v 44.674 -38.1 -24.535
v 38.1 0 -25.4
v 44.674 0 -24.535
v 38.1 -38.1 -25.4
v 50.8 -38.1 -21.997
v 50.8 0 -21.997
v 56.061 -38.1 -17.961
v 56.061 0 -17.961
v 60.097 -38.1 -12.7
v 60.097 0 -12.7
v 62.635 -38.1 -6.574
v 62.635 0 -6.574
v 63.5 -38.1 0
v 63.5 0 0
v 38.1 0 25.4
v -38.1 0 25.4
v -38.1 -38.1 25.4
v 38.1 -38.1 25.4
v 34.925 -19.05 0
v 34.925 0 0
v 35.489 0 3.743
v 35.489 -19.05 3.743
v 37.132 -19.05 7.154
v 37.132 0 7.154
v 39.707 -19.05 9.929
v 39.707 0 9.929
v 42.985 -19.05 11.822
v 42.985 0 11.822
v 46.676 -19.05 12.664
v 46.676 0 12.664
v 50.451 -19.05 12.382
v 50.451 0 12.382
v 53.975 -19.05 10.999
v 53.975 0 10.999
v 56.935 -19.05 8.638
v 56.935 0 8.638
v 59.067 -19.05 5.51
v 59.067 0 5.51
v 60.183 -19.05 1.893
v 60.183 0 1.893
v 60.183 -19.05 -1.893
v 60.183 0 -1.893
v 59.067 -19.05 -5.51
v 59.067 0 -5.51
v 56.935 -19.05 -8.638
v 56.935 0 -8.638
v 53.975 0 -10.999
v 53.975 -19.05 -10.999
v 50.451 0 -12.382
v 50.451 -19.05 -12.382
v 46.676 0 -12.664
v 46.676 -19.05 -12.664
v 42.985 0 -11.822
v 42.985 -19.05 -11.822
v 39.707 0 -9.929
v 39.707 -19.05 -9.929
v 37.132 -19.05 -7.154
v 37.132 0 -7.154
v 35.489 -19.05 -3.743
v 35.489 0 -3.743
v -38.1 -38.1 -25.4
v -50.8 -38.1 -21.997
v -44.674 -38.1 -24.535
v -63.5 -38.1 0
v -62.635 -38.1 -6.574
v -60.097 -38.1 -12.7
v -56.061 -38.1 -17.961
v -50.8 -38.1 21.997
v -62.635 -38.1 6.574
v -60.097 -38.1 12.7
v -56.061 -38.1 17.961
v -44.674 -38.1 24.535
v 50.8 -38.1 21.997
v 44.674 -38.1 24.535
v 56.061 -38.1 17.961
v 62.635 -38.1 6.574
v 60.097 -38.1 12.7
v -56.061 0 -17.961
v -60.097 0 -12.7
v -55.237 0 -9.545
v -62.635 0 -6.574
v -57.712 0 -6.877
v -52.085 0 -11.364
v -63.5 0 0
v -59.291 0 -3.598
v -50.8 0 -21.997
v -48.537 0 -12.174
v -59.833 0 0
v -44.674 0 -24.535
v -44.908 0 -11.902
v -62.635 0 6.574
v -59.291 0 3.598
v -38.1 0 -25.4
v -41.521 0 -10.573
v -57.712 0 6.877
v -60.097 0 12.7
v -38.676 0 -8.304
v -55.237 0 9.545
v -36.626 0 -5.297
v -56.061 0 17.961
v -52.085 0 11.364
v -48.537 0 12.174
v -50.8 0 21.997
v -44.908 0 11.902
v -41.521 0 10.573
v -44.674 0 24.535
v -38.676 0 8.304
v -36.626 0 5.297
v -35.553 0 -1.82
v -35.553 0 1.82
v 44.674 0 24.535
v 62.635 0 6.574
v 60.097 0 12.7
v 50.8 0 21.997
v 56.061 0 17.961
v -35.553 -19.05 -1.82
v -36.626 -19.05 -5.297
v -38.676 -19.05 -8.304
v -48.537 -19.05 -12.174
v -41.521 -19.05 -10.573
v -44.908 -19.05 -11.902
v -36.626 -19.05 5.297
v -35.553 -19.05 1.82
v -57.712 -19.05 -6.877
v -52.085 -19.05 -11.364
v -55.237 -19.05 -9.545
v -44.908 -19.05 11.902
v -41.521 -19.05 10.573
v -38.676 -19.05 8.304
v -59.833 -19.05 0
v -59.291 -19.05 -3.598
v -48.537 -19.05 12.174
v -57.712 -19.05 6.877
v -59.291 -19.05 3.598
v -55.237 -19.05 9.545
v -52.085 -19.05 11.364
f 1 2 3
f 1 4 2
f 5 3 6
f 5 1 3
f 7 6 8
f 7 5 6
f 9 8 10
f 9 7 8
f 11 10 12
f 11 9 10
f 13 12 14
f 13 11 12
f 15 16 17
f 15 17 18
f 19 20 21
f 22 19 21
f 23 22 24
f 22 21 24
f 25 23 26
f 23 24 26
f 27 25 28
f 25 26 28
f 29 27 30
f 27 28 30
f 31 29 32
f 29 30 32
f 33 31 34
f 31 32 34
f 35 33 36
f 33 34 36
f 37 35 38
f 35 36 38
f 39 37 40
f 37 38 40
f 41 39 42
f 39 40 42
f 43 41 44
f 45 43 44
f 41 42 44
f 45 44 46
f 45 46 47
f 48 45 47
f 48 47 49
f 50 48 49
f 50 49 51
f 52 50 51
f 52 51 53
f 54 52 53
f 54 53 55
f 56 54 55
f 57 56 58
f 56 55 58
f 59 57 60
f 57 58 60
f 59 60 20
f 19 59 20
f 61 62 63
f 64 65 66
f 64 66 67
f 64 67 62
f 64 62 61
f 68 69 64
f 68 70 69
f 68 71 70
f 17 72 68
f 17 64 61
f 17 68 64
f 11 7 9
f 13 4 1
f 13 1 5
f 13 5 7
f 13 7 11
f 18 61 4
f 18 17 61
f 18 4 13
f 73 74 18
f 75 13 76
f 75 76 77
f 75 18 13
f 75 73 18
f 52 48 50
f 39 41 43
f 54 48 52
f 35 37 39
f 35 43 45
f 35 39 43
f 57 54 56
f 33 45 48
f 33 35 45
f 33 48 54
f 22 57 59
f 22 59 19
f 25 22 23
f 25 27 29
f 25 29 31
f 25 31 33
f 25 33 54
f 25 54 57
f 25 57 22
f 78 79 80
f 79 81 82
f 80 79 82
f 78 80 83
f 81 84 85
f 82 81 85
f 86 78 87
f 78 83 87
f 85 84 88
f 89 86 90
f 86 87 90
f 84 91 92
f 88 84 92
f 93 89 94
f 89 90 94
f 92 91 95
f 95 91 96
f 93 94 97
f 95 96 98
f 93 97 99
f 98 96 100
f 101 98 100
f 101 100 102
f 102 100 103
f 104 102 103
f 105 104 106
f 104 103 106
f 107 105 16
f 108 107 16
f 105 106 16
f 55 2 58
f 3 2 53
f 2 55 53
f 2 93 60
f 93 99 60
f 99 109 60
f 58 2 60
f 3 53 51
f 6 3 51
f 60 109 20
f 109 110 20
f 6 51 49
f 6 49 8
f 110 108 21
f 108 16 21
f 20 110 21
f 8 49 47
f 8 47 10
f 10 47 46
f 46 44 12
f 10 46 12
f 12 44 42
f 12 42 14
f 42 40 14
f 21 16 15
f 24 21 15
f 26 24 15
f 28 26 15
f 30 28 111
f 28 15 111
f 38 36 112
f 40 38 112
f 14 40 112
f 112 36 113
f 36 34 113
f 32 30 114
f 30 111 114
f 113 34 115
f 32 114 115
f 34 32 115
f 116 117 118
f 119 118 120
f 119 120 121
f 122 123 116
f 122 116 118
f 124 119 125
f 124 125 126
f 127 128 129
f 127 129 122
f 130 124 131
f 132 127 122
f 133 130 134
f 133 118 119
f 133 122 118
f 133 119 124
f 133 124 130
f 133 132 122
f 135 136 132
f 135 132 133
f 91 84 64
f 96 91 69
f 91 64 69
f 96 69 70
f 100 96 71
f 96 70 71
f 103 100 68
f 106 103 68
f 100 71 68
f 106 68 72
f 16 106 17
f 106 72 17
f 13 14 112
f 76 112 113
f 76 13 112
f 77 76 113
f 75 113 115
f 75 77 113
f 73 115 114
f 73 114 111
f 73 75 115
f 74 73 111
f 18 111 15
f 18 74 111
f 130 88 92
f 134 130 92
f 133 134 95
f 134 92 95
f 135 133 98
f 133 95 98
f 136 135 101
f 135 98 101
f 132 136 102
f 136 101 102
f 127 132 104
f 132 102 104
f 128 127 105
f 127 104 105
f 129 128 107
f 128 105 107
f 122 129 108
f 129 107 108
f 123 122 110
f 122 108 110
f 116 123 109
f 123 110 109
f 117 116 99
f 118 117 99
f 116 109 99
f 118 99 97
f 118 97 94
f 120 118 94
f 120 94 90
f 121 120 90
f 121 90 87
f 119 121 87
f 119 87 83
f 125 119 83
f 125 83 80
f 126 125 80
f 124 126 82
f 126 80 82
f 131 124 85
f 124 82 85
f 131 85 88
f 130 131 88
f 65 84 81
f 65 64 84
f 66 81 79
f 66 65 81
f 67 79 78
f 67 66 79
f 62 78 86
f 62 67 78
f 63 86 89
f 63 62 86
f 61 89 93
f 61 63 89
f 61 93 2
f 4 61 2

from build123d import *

# Parameters (mm, degrees)
F0_W     = 127
F0_H     = 50.8
F1_DEPTH = 38.1
F2_R     = 25.39999
F3_R     = 12.2082879552
F3_R_2   = 12.7
F4_DEPTH = 19.05


# Not quite as in the source:
# - a fillet or chamfer is up to 0.001 mm smaller than in the source, because OpenCascade refuses the exact size


with BuildPart() as f1:
    # F0 (on Front) → F1 (new body)
    with BuildSketch(Plane.XZ):
        Rectangle(F0_W, F0_H)
    extrude(amount=F1_DEPTH)

    # F2 (radius 25.4 in the source; OpenCascade refuses exactly that, so slightly less here)
    f2_edges = [f1.edges().sort_by_distance(p)[0] for p in [
        (63.5, -19.05, 25.4),
        (63.5, -19.05, -25.4),
        (-63.5, -19.05, 25.4),
        (-63.5, -19.05, -25.4),
    ]]
    fillet(f2_edges, radius=F2_R)

    # F3 (on face) → F4 (cut)
    with BuildSketch(Plane(origin=(0, 0, 0), x_dir=(-1, 0, 0), z_dir=(0, 1, 0))):
        with Locations((47.625, 0)):
            Circle(F3_R)
        with Locations((-47.625, 0)):
            Circle(F3_R_2)
    extrude(amount=-F4_DEPTH, mode=Mode.SUBTRACT)


solid = f1.part
